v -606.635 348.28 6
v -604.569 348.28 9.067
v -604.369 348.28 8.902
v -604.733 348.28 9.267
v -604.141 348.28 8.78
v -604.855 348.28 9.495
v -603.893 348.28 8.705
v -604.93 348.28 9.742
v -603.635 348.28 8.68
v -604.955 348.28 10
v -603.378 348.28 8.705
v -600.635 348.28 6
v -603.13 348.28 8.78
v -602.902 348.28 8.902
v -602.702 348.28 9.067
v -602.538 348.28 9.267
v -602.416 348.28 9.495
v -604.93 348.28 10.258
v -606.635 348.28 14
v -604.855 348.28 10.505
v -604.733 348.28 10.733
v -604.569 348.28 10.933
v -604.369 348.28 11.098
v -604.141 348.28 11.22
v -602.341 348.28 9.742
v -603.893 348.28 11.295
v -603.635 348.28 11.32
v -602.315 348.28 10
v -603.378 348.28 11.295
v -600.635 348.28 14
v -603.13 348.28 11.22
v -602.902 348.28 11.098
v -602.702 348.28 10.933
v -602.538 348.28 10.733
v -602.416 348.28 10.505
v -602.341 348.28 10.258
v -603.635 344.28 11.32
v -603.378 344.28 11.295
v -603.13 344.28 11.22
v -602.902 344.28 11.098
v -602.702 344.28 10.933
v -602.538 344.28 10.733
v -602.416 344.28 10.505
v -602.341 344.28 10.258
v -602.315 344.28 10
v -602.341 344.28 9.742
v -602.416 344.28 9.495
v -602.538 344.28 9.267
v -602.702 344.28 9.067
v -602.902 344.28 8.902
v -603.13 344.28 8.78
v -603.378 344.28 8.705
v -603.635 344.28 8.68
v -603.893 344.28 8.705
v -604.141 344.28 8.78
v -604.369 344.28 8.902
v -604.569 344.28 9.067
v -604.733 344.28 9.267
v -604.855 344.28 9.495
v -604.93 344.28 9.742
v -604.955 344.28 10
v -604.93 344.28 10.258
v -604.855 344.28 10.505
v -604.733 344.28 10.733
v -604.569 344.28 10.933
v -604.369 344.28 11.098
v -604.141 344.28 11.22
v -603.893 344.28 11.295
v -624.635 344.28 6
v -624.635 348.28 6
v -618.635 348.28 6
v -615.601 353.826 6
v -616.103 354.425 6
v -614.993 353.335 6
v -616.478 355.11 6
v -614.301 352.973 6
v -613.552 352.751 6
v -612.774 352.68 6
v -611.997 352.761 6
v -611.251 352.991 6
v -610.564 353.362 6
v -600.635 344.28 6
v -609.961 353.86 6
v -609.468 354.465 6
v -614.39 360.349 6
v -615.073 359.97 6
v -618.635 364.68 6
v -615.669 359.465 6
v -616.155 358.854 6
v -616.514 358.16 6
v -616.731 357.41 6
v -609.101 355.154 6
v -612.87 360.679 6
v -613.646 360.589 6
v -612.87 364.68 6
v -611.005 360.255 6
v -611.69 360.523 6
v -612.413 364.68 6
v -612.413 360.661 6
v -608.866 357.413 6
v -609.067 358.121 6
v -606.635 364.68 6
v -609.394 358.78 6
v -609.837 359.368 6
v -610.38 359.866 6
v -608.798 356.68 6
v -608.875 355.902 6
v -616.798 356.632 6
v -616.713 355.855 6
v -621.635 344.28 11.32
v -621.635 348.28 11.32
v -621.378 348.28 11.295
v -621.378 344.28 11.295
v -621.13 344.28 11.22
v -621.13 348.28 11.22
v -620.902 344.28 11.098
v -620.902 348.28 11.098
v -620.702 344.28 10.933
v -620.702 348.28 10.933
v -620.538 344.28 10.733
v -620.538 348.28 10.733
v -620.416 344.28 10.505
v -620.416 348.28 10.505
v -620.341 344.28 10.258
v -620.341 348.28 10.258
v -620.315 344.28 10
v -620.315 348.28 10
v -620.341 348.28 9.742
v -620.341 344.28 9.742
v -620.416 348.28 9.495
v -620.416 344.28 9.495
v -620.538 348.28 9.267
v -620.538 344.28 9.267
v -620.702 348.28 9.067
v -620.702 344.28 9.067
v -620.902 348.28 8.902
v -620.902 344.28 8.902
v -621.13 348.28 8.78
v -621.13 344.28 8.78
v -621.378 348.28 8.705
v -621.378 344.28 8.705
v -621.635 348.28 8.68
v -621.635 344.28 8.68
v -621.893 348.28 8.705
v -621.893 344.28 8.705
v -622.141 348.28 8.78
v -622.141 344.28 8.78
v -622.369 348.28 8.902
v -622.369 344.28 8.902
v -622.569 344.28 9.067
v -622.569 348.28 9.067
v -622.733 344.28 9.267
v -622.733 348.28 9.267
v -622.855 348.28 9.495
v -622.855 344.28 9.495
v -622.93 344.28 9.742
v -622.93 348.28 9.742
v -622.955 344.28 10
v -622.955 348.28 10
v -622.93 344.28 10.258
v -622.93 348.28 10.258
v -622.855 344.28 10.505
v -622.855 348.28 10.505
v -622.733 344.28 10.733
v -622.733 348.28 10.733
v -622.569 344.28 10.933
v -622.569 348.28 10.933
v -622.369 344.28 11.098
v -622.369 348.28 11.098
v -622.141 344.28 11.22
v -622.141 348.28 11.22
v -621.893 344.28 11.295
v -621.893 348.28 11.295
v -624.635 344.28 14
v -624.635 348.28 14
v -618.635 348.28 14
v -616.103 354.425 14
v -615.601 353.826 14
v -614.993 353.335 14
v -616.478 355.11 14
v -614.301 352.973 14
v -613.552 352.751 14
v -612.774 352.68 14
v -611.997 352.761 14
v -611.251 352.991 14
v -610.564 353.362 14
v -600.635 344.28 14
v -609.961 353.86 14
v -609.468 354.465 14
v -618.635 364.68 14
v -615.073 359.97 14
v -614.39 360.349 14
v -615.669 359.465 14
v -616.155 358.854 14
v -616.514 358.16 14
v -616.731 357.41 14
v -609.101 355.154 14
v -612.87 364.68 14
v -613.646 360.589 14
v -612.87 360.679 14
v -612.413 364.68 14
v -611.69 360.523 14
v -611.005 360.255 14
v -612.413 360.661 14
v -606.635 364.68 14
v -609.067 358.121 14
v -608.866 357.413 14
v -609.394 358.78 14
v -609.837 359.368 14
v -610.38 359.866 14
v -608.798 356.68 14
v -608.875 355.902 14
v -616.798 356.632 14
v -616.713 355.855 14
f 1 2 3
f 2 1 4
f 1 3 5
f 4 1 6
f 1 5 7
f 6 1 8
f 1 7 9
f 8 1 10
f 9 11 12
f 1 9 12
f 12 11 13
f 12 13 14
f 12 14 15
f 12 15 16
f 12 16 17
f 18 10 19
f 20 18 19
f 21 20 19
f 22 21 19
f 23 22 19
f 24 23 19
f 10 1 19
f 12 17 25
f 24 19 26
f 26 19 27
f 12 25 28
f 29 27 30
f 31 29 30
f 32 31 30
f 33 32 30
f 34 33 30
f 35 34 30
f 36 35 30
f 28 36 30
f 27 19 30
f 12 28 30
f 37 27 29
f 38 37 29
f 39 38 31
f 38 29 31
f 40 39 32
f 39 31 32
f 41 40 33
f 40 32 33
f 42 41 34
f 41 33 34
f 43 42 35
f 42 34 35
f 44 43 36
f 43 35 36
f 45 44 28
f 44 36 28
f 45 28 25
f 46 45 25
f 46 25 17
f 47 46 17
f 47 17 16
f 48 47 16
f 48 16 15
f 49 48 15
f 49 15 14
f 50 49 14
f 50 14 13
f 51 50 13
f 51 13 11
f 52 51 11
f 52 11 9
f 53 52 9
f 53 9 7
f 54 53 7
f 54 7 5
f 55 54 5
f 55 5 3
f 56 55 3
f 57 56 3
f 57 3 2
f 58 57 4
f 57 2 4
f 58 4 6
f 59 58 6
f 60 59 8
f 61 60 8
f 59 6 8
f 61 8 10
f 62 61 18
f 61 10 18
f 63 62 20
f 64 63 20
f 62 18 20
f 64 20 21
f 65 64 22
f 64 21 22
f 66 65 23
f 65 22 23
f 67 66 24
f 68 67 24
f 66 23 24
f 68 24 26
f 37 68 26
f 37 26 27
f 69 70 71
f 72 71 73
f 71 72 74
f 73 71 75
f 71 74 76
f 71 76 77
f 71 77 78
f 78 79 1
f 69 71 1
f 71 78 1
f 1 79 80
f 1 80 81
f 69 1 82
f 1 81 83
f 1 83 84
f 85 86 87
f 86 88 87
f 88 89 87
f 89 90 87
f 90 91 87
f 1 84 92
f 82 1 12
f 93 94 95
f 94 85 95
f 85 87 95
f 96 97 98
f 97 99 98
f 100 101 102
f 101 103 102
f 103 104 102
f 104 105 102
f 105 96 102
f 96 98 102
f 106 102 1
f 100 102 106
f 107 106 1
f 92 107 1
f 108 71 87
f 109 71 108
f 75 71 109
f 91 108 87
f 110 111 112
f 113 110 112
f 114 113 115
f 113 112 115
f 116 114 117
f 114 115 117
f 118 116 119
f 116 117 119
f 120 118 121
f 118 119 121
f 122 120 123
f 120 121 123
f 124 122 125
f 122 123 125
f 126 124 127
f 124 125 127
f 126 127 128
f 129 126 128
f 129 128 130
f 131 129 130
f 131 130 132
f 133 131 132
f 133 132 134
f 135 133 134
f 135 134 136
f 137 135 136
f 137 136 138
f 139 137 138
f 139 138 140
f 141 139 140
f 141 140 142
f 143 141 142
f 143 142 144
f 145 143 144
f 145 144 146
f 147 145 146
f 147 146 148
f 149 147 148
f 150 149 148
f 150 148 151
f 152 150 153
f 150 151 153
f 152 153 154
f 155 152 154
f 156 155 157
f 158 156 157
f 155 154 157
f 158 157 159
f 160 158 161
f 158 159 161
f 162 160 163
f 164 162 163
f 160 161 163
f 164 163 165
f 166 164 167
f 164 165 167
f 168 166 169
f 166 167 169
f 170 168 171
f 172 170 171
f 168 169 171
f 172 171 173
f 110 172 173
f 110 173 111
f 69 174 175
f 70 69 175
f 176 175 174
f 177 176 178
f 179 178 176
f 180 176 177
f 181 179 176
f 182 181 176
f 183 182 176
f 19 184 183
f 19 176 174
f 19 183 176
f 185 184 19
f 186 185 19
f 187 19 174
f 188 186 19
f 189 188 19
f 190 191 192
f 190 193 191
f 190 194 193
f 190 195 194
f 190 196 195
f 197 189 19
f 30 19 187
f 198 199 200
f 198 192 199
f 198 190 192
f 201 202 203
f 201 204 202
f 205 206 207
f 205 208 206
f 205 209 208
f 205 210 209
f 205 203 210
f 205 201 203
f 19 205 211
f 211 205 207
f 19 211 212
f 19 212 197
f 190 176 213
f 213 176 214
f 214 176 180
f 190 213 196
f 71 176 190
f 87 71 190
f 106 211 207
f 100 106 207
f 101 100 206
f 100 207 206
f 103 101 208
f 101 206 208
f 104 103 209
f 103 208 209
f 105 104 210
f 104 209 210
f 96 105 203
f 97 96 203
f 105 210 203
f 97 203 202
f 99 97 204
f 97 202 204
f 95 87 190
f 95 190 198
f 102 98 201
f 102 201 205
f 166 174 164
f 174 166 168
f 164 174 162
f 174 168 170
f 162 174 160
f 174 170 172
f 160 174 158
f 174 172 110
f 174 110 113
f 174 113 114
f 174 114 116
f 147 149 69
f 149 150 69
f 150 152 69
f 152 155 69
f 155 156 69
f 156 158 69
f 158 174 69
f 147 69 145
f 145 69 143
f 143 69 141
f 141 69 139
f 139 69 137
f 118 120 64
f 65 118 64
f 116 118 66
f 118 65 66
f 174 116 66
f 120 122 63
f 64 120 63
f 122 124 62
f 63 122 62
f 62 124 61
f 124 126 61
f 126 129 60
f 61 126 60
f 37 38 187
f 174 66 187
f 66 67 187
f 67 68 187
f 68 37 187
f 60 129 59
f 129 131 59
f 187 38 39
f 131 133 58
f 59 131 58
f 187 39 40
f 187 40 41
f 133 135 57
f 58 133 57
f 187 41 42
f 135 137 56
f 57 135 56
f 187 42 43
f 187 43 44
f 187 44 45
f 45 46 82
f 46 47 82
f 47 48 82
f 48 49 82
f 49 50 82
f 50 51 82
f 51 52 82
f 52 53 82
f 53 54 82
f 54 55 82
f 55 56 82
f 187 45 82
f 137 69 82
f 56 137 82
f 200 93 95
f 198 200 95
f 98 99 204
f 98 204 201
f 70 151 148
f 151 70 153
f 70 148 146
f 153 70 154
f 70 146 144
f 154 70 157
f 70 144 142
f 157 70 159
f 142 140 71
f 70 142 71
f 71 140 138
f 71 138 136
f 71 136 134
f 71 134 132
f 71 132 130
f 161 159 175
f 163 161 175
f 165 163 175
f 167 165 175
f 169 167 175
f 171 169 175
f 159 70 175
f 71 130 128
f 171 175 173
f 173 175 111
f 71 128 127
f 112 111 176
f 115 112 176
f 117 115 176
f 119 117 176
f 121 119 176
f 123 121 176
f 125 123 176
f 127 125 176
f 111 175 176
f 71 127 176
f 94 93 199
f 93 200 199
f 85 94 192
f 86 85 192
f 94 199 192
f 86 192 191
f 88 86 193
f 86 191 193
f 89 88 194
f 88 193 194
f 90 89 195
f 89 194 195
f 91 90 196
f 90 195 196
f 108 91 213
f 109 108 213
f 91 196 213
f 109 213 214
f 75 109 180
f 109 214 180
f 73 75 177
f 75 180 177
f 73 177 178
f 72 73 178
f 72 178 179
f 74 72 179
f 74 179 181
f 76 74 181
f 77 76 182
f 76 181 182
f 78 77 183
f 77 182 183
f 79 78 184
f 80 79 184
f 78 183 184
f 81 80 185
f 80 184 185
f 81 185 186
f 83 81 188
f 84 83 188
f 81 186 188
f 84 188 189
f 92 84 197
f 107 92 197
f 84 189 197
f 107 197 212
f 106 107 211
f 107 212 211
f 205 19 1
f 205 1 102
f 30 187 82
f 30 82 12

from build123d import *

# Parameters (mm, degrees)
SKETCH1_W           = 60
SKETCH1_H           = 51
BOSS_EXTRUDE1_DEPTH = 20
SKETCH2_W           = 15
SKETCH2_H           = 41
CUT_EXTRUDE1_DEPTH  = 20
SKETCH3_R           = 10
CUT_EXTRUDE2_DEPTH  = 20
SKETCH4_R           = 3.3
CUT_EXTRUDE3_DEPTH  = 20
SKETCH7_W           = 1.141811335
SKETCH7_H           = 10.046427162
CUT_EXTRUDE4_DEPTH  = 20
SCALE1_SCALE        = 0.8
SCALE2_SCALE        = 0.5


with BuildPart() as part:
    # Sketch1 → Boss-Extrude1 (new body)
    with BuildSketch(Plane.XY):
        with Locations((-612.687747036, 357.503952569)):
            Rectangle(SKETCH1_W, SKETCH1_H)
    extrude(amount=BOSS_EXTRUDE1_DEPTH)

    # Sketch2 → Cut-Extrude1 (cut)
    with BuildSketch(Plane.XY.offset(20)):
        with Locations((-635.187747036, 362.503952569)):
            Rectangle(SKETCH2_W, SKETCH2_H)
        with Locations((-590.187747036, 362.503952569)):
            Rectangle(SKETCH2_W, SKETCH2_H)
    extrude(amount=-CUT_EXTRUDE1_DEPTH, mode=Mode.SUBTRACT)

    # Sketch3 → Cut-Extrude2 (cut)
    with BuildSketch(Plane.XY.offset(20)):
        with Locations((-613.095017258, 363.003952569)):
            Circle(SKETCH3_R)
    extrude(amount=-CUT_EXTRUDE2_DEPTH, mode=Mode.SUBTRACT)

    # Sketch4 → Cut-Extrude3 (cut)
    with BuildSketch(Plane(origin=(0, 342.003952569, 0), x_dir=(1, 0, 0), z_dir=(0, 1, 0))):
        with Locations(Location((-635.187747036, -10, 0), (0, 0, 270))):
            Circle(SKETCH4_R)
        with Locations(Location((-590.187747036, -10, 0), (0, 0, 270))):
            Circle(SKETCH4_R)
    extrude(amount=-CUT_EXTRUDE3_DEPTH, mode=Mode.SUBTRACT)

    # Sketch7 → Cut-Extrude4 (cut)
    with BuildSketch(Plane.XY.offset(20)):
        with Locations((-612.703432528, 377.980738988)):
            Rectangle(SKETCH7_W, SKETCH7_H)
    extrude(amount=-CUT_EXTRUDE4_DEPTH, mode=Mode.SUBTRACT)


with BuildPart() as part_1:
    # Scale1: scaled about (-612.600600691, 352.463239706, 10)
    add(part.part.scale(SCALE1_SCALE).moved(Location((-122.520120138, 70.492647941, 2))))


with BuildPart() as part_2:
    # Scale2: scaled about (-612.600600691, 352.463239706, 10)
    add(part_1.part.scale(SCALE2_SCALE).moved(Location((-306.300300345, 176.231619853, 5))))


solid = part_2.part
